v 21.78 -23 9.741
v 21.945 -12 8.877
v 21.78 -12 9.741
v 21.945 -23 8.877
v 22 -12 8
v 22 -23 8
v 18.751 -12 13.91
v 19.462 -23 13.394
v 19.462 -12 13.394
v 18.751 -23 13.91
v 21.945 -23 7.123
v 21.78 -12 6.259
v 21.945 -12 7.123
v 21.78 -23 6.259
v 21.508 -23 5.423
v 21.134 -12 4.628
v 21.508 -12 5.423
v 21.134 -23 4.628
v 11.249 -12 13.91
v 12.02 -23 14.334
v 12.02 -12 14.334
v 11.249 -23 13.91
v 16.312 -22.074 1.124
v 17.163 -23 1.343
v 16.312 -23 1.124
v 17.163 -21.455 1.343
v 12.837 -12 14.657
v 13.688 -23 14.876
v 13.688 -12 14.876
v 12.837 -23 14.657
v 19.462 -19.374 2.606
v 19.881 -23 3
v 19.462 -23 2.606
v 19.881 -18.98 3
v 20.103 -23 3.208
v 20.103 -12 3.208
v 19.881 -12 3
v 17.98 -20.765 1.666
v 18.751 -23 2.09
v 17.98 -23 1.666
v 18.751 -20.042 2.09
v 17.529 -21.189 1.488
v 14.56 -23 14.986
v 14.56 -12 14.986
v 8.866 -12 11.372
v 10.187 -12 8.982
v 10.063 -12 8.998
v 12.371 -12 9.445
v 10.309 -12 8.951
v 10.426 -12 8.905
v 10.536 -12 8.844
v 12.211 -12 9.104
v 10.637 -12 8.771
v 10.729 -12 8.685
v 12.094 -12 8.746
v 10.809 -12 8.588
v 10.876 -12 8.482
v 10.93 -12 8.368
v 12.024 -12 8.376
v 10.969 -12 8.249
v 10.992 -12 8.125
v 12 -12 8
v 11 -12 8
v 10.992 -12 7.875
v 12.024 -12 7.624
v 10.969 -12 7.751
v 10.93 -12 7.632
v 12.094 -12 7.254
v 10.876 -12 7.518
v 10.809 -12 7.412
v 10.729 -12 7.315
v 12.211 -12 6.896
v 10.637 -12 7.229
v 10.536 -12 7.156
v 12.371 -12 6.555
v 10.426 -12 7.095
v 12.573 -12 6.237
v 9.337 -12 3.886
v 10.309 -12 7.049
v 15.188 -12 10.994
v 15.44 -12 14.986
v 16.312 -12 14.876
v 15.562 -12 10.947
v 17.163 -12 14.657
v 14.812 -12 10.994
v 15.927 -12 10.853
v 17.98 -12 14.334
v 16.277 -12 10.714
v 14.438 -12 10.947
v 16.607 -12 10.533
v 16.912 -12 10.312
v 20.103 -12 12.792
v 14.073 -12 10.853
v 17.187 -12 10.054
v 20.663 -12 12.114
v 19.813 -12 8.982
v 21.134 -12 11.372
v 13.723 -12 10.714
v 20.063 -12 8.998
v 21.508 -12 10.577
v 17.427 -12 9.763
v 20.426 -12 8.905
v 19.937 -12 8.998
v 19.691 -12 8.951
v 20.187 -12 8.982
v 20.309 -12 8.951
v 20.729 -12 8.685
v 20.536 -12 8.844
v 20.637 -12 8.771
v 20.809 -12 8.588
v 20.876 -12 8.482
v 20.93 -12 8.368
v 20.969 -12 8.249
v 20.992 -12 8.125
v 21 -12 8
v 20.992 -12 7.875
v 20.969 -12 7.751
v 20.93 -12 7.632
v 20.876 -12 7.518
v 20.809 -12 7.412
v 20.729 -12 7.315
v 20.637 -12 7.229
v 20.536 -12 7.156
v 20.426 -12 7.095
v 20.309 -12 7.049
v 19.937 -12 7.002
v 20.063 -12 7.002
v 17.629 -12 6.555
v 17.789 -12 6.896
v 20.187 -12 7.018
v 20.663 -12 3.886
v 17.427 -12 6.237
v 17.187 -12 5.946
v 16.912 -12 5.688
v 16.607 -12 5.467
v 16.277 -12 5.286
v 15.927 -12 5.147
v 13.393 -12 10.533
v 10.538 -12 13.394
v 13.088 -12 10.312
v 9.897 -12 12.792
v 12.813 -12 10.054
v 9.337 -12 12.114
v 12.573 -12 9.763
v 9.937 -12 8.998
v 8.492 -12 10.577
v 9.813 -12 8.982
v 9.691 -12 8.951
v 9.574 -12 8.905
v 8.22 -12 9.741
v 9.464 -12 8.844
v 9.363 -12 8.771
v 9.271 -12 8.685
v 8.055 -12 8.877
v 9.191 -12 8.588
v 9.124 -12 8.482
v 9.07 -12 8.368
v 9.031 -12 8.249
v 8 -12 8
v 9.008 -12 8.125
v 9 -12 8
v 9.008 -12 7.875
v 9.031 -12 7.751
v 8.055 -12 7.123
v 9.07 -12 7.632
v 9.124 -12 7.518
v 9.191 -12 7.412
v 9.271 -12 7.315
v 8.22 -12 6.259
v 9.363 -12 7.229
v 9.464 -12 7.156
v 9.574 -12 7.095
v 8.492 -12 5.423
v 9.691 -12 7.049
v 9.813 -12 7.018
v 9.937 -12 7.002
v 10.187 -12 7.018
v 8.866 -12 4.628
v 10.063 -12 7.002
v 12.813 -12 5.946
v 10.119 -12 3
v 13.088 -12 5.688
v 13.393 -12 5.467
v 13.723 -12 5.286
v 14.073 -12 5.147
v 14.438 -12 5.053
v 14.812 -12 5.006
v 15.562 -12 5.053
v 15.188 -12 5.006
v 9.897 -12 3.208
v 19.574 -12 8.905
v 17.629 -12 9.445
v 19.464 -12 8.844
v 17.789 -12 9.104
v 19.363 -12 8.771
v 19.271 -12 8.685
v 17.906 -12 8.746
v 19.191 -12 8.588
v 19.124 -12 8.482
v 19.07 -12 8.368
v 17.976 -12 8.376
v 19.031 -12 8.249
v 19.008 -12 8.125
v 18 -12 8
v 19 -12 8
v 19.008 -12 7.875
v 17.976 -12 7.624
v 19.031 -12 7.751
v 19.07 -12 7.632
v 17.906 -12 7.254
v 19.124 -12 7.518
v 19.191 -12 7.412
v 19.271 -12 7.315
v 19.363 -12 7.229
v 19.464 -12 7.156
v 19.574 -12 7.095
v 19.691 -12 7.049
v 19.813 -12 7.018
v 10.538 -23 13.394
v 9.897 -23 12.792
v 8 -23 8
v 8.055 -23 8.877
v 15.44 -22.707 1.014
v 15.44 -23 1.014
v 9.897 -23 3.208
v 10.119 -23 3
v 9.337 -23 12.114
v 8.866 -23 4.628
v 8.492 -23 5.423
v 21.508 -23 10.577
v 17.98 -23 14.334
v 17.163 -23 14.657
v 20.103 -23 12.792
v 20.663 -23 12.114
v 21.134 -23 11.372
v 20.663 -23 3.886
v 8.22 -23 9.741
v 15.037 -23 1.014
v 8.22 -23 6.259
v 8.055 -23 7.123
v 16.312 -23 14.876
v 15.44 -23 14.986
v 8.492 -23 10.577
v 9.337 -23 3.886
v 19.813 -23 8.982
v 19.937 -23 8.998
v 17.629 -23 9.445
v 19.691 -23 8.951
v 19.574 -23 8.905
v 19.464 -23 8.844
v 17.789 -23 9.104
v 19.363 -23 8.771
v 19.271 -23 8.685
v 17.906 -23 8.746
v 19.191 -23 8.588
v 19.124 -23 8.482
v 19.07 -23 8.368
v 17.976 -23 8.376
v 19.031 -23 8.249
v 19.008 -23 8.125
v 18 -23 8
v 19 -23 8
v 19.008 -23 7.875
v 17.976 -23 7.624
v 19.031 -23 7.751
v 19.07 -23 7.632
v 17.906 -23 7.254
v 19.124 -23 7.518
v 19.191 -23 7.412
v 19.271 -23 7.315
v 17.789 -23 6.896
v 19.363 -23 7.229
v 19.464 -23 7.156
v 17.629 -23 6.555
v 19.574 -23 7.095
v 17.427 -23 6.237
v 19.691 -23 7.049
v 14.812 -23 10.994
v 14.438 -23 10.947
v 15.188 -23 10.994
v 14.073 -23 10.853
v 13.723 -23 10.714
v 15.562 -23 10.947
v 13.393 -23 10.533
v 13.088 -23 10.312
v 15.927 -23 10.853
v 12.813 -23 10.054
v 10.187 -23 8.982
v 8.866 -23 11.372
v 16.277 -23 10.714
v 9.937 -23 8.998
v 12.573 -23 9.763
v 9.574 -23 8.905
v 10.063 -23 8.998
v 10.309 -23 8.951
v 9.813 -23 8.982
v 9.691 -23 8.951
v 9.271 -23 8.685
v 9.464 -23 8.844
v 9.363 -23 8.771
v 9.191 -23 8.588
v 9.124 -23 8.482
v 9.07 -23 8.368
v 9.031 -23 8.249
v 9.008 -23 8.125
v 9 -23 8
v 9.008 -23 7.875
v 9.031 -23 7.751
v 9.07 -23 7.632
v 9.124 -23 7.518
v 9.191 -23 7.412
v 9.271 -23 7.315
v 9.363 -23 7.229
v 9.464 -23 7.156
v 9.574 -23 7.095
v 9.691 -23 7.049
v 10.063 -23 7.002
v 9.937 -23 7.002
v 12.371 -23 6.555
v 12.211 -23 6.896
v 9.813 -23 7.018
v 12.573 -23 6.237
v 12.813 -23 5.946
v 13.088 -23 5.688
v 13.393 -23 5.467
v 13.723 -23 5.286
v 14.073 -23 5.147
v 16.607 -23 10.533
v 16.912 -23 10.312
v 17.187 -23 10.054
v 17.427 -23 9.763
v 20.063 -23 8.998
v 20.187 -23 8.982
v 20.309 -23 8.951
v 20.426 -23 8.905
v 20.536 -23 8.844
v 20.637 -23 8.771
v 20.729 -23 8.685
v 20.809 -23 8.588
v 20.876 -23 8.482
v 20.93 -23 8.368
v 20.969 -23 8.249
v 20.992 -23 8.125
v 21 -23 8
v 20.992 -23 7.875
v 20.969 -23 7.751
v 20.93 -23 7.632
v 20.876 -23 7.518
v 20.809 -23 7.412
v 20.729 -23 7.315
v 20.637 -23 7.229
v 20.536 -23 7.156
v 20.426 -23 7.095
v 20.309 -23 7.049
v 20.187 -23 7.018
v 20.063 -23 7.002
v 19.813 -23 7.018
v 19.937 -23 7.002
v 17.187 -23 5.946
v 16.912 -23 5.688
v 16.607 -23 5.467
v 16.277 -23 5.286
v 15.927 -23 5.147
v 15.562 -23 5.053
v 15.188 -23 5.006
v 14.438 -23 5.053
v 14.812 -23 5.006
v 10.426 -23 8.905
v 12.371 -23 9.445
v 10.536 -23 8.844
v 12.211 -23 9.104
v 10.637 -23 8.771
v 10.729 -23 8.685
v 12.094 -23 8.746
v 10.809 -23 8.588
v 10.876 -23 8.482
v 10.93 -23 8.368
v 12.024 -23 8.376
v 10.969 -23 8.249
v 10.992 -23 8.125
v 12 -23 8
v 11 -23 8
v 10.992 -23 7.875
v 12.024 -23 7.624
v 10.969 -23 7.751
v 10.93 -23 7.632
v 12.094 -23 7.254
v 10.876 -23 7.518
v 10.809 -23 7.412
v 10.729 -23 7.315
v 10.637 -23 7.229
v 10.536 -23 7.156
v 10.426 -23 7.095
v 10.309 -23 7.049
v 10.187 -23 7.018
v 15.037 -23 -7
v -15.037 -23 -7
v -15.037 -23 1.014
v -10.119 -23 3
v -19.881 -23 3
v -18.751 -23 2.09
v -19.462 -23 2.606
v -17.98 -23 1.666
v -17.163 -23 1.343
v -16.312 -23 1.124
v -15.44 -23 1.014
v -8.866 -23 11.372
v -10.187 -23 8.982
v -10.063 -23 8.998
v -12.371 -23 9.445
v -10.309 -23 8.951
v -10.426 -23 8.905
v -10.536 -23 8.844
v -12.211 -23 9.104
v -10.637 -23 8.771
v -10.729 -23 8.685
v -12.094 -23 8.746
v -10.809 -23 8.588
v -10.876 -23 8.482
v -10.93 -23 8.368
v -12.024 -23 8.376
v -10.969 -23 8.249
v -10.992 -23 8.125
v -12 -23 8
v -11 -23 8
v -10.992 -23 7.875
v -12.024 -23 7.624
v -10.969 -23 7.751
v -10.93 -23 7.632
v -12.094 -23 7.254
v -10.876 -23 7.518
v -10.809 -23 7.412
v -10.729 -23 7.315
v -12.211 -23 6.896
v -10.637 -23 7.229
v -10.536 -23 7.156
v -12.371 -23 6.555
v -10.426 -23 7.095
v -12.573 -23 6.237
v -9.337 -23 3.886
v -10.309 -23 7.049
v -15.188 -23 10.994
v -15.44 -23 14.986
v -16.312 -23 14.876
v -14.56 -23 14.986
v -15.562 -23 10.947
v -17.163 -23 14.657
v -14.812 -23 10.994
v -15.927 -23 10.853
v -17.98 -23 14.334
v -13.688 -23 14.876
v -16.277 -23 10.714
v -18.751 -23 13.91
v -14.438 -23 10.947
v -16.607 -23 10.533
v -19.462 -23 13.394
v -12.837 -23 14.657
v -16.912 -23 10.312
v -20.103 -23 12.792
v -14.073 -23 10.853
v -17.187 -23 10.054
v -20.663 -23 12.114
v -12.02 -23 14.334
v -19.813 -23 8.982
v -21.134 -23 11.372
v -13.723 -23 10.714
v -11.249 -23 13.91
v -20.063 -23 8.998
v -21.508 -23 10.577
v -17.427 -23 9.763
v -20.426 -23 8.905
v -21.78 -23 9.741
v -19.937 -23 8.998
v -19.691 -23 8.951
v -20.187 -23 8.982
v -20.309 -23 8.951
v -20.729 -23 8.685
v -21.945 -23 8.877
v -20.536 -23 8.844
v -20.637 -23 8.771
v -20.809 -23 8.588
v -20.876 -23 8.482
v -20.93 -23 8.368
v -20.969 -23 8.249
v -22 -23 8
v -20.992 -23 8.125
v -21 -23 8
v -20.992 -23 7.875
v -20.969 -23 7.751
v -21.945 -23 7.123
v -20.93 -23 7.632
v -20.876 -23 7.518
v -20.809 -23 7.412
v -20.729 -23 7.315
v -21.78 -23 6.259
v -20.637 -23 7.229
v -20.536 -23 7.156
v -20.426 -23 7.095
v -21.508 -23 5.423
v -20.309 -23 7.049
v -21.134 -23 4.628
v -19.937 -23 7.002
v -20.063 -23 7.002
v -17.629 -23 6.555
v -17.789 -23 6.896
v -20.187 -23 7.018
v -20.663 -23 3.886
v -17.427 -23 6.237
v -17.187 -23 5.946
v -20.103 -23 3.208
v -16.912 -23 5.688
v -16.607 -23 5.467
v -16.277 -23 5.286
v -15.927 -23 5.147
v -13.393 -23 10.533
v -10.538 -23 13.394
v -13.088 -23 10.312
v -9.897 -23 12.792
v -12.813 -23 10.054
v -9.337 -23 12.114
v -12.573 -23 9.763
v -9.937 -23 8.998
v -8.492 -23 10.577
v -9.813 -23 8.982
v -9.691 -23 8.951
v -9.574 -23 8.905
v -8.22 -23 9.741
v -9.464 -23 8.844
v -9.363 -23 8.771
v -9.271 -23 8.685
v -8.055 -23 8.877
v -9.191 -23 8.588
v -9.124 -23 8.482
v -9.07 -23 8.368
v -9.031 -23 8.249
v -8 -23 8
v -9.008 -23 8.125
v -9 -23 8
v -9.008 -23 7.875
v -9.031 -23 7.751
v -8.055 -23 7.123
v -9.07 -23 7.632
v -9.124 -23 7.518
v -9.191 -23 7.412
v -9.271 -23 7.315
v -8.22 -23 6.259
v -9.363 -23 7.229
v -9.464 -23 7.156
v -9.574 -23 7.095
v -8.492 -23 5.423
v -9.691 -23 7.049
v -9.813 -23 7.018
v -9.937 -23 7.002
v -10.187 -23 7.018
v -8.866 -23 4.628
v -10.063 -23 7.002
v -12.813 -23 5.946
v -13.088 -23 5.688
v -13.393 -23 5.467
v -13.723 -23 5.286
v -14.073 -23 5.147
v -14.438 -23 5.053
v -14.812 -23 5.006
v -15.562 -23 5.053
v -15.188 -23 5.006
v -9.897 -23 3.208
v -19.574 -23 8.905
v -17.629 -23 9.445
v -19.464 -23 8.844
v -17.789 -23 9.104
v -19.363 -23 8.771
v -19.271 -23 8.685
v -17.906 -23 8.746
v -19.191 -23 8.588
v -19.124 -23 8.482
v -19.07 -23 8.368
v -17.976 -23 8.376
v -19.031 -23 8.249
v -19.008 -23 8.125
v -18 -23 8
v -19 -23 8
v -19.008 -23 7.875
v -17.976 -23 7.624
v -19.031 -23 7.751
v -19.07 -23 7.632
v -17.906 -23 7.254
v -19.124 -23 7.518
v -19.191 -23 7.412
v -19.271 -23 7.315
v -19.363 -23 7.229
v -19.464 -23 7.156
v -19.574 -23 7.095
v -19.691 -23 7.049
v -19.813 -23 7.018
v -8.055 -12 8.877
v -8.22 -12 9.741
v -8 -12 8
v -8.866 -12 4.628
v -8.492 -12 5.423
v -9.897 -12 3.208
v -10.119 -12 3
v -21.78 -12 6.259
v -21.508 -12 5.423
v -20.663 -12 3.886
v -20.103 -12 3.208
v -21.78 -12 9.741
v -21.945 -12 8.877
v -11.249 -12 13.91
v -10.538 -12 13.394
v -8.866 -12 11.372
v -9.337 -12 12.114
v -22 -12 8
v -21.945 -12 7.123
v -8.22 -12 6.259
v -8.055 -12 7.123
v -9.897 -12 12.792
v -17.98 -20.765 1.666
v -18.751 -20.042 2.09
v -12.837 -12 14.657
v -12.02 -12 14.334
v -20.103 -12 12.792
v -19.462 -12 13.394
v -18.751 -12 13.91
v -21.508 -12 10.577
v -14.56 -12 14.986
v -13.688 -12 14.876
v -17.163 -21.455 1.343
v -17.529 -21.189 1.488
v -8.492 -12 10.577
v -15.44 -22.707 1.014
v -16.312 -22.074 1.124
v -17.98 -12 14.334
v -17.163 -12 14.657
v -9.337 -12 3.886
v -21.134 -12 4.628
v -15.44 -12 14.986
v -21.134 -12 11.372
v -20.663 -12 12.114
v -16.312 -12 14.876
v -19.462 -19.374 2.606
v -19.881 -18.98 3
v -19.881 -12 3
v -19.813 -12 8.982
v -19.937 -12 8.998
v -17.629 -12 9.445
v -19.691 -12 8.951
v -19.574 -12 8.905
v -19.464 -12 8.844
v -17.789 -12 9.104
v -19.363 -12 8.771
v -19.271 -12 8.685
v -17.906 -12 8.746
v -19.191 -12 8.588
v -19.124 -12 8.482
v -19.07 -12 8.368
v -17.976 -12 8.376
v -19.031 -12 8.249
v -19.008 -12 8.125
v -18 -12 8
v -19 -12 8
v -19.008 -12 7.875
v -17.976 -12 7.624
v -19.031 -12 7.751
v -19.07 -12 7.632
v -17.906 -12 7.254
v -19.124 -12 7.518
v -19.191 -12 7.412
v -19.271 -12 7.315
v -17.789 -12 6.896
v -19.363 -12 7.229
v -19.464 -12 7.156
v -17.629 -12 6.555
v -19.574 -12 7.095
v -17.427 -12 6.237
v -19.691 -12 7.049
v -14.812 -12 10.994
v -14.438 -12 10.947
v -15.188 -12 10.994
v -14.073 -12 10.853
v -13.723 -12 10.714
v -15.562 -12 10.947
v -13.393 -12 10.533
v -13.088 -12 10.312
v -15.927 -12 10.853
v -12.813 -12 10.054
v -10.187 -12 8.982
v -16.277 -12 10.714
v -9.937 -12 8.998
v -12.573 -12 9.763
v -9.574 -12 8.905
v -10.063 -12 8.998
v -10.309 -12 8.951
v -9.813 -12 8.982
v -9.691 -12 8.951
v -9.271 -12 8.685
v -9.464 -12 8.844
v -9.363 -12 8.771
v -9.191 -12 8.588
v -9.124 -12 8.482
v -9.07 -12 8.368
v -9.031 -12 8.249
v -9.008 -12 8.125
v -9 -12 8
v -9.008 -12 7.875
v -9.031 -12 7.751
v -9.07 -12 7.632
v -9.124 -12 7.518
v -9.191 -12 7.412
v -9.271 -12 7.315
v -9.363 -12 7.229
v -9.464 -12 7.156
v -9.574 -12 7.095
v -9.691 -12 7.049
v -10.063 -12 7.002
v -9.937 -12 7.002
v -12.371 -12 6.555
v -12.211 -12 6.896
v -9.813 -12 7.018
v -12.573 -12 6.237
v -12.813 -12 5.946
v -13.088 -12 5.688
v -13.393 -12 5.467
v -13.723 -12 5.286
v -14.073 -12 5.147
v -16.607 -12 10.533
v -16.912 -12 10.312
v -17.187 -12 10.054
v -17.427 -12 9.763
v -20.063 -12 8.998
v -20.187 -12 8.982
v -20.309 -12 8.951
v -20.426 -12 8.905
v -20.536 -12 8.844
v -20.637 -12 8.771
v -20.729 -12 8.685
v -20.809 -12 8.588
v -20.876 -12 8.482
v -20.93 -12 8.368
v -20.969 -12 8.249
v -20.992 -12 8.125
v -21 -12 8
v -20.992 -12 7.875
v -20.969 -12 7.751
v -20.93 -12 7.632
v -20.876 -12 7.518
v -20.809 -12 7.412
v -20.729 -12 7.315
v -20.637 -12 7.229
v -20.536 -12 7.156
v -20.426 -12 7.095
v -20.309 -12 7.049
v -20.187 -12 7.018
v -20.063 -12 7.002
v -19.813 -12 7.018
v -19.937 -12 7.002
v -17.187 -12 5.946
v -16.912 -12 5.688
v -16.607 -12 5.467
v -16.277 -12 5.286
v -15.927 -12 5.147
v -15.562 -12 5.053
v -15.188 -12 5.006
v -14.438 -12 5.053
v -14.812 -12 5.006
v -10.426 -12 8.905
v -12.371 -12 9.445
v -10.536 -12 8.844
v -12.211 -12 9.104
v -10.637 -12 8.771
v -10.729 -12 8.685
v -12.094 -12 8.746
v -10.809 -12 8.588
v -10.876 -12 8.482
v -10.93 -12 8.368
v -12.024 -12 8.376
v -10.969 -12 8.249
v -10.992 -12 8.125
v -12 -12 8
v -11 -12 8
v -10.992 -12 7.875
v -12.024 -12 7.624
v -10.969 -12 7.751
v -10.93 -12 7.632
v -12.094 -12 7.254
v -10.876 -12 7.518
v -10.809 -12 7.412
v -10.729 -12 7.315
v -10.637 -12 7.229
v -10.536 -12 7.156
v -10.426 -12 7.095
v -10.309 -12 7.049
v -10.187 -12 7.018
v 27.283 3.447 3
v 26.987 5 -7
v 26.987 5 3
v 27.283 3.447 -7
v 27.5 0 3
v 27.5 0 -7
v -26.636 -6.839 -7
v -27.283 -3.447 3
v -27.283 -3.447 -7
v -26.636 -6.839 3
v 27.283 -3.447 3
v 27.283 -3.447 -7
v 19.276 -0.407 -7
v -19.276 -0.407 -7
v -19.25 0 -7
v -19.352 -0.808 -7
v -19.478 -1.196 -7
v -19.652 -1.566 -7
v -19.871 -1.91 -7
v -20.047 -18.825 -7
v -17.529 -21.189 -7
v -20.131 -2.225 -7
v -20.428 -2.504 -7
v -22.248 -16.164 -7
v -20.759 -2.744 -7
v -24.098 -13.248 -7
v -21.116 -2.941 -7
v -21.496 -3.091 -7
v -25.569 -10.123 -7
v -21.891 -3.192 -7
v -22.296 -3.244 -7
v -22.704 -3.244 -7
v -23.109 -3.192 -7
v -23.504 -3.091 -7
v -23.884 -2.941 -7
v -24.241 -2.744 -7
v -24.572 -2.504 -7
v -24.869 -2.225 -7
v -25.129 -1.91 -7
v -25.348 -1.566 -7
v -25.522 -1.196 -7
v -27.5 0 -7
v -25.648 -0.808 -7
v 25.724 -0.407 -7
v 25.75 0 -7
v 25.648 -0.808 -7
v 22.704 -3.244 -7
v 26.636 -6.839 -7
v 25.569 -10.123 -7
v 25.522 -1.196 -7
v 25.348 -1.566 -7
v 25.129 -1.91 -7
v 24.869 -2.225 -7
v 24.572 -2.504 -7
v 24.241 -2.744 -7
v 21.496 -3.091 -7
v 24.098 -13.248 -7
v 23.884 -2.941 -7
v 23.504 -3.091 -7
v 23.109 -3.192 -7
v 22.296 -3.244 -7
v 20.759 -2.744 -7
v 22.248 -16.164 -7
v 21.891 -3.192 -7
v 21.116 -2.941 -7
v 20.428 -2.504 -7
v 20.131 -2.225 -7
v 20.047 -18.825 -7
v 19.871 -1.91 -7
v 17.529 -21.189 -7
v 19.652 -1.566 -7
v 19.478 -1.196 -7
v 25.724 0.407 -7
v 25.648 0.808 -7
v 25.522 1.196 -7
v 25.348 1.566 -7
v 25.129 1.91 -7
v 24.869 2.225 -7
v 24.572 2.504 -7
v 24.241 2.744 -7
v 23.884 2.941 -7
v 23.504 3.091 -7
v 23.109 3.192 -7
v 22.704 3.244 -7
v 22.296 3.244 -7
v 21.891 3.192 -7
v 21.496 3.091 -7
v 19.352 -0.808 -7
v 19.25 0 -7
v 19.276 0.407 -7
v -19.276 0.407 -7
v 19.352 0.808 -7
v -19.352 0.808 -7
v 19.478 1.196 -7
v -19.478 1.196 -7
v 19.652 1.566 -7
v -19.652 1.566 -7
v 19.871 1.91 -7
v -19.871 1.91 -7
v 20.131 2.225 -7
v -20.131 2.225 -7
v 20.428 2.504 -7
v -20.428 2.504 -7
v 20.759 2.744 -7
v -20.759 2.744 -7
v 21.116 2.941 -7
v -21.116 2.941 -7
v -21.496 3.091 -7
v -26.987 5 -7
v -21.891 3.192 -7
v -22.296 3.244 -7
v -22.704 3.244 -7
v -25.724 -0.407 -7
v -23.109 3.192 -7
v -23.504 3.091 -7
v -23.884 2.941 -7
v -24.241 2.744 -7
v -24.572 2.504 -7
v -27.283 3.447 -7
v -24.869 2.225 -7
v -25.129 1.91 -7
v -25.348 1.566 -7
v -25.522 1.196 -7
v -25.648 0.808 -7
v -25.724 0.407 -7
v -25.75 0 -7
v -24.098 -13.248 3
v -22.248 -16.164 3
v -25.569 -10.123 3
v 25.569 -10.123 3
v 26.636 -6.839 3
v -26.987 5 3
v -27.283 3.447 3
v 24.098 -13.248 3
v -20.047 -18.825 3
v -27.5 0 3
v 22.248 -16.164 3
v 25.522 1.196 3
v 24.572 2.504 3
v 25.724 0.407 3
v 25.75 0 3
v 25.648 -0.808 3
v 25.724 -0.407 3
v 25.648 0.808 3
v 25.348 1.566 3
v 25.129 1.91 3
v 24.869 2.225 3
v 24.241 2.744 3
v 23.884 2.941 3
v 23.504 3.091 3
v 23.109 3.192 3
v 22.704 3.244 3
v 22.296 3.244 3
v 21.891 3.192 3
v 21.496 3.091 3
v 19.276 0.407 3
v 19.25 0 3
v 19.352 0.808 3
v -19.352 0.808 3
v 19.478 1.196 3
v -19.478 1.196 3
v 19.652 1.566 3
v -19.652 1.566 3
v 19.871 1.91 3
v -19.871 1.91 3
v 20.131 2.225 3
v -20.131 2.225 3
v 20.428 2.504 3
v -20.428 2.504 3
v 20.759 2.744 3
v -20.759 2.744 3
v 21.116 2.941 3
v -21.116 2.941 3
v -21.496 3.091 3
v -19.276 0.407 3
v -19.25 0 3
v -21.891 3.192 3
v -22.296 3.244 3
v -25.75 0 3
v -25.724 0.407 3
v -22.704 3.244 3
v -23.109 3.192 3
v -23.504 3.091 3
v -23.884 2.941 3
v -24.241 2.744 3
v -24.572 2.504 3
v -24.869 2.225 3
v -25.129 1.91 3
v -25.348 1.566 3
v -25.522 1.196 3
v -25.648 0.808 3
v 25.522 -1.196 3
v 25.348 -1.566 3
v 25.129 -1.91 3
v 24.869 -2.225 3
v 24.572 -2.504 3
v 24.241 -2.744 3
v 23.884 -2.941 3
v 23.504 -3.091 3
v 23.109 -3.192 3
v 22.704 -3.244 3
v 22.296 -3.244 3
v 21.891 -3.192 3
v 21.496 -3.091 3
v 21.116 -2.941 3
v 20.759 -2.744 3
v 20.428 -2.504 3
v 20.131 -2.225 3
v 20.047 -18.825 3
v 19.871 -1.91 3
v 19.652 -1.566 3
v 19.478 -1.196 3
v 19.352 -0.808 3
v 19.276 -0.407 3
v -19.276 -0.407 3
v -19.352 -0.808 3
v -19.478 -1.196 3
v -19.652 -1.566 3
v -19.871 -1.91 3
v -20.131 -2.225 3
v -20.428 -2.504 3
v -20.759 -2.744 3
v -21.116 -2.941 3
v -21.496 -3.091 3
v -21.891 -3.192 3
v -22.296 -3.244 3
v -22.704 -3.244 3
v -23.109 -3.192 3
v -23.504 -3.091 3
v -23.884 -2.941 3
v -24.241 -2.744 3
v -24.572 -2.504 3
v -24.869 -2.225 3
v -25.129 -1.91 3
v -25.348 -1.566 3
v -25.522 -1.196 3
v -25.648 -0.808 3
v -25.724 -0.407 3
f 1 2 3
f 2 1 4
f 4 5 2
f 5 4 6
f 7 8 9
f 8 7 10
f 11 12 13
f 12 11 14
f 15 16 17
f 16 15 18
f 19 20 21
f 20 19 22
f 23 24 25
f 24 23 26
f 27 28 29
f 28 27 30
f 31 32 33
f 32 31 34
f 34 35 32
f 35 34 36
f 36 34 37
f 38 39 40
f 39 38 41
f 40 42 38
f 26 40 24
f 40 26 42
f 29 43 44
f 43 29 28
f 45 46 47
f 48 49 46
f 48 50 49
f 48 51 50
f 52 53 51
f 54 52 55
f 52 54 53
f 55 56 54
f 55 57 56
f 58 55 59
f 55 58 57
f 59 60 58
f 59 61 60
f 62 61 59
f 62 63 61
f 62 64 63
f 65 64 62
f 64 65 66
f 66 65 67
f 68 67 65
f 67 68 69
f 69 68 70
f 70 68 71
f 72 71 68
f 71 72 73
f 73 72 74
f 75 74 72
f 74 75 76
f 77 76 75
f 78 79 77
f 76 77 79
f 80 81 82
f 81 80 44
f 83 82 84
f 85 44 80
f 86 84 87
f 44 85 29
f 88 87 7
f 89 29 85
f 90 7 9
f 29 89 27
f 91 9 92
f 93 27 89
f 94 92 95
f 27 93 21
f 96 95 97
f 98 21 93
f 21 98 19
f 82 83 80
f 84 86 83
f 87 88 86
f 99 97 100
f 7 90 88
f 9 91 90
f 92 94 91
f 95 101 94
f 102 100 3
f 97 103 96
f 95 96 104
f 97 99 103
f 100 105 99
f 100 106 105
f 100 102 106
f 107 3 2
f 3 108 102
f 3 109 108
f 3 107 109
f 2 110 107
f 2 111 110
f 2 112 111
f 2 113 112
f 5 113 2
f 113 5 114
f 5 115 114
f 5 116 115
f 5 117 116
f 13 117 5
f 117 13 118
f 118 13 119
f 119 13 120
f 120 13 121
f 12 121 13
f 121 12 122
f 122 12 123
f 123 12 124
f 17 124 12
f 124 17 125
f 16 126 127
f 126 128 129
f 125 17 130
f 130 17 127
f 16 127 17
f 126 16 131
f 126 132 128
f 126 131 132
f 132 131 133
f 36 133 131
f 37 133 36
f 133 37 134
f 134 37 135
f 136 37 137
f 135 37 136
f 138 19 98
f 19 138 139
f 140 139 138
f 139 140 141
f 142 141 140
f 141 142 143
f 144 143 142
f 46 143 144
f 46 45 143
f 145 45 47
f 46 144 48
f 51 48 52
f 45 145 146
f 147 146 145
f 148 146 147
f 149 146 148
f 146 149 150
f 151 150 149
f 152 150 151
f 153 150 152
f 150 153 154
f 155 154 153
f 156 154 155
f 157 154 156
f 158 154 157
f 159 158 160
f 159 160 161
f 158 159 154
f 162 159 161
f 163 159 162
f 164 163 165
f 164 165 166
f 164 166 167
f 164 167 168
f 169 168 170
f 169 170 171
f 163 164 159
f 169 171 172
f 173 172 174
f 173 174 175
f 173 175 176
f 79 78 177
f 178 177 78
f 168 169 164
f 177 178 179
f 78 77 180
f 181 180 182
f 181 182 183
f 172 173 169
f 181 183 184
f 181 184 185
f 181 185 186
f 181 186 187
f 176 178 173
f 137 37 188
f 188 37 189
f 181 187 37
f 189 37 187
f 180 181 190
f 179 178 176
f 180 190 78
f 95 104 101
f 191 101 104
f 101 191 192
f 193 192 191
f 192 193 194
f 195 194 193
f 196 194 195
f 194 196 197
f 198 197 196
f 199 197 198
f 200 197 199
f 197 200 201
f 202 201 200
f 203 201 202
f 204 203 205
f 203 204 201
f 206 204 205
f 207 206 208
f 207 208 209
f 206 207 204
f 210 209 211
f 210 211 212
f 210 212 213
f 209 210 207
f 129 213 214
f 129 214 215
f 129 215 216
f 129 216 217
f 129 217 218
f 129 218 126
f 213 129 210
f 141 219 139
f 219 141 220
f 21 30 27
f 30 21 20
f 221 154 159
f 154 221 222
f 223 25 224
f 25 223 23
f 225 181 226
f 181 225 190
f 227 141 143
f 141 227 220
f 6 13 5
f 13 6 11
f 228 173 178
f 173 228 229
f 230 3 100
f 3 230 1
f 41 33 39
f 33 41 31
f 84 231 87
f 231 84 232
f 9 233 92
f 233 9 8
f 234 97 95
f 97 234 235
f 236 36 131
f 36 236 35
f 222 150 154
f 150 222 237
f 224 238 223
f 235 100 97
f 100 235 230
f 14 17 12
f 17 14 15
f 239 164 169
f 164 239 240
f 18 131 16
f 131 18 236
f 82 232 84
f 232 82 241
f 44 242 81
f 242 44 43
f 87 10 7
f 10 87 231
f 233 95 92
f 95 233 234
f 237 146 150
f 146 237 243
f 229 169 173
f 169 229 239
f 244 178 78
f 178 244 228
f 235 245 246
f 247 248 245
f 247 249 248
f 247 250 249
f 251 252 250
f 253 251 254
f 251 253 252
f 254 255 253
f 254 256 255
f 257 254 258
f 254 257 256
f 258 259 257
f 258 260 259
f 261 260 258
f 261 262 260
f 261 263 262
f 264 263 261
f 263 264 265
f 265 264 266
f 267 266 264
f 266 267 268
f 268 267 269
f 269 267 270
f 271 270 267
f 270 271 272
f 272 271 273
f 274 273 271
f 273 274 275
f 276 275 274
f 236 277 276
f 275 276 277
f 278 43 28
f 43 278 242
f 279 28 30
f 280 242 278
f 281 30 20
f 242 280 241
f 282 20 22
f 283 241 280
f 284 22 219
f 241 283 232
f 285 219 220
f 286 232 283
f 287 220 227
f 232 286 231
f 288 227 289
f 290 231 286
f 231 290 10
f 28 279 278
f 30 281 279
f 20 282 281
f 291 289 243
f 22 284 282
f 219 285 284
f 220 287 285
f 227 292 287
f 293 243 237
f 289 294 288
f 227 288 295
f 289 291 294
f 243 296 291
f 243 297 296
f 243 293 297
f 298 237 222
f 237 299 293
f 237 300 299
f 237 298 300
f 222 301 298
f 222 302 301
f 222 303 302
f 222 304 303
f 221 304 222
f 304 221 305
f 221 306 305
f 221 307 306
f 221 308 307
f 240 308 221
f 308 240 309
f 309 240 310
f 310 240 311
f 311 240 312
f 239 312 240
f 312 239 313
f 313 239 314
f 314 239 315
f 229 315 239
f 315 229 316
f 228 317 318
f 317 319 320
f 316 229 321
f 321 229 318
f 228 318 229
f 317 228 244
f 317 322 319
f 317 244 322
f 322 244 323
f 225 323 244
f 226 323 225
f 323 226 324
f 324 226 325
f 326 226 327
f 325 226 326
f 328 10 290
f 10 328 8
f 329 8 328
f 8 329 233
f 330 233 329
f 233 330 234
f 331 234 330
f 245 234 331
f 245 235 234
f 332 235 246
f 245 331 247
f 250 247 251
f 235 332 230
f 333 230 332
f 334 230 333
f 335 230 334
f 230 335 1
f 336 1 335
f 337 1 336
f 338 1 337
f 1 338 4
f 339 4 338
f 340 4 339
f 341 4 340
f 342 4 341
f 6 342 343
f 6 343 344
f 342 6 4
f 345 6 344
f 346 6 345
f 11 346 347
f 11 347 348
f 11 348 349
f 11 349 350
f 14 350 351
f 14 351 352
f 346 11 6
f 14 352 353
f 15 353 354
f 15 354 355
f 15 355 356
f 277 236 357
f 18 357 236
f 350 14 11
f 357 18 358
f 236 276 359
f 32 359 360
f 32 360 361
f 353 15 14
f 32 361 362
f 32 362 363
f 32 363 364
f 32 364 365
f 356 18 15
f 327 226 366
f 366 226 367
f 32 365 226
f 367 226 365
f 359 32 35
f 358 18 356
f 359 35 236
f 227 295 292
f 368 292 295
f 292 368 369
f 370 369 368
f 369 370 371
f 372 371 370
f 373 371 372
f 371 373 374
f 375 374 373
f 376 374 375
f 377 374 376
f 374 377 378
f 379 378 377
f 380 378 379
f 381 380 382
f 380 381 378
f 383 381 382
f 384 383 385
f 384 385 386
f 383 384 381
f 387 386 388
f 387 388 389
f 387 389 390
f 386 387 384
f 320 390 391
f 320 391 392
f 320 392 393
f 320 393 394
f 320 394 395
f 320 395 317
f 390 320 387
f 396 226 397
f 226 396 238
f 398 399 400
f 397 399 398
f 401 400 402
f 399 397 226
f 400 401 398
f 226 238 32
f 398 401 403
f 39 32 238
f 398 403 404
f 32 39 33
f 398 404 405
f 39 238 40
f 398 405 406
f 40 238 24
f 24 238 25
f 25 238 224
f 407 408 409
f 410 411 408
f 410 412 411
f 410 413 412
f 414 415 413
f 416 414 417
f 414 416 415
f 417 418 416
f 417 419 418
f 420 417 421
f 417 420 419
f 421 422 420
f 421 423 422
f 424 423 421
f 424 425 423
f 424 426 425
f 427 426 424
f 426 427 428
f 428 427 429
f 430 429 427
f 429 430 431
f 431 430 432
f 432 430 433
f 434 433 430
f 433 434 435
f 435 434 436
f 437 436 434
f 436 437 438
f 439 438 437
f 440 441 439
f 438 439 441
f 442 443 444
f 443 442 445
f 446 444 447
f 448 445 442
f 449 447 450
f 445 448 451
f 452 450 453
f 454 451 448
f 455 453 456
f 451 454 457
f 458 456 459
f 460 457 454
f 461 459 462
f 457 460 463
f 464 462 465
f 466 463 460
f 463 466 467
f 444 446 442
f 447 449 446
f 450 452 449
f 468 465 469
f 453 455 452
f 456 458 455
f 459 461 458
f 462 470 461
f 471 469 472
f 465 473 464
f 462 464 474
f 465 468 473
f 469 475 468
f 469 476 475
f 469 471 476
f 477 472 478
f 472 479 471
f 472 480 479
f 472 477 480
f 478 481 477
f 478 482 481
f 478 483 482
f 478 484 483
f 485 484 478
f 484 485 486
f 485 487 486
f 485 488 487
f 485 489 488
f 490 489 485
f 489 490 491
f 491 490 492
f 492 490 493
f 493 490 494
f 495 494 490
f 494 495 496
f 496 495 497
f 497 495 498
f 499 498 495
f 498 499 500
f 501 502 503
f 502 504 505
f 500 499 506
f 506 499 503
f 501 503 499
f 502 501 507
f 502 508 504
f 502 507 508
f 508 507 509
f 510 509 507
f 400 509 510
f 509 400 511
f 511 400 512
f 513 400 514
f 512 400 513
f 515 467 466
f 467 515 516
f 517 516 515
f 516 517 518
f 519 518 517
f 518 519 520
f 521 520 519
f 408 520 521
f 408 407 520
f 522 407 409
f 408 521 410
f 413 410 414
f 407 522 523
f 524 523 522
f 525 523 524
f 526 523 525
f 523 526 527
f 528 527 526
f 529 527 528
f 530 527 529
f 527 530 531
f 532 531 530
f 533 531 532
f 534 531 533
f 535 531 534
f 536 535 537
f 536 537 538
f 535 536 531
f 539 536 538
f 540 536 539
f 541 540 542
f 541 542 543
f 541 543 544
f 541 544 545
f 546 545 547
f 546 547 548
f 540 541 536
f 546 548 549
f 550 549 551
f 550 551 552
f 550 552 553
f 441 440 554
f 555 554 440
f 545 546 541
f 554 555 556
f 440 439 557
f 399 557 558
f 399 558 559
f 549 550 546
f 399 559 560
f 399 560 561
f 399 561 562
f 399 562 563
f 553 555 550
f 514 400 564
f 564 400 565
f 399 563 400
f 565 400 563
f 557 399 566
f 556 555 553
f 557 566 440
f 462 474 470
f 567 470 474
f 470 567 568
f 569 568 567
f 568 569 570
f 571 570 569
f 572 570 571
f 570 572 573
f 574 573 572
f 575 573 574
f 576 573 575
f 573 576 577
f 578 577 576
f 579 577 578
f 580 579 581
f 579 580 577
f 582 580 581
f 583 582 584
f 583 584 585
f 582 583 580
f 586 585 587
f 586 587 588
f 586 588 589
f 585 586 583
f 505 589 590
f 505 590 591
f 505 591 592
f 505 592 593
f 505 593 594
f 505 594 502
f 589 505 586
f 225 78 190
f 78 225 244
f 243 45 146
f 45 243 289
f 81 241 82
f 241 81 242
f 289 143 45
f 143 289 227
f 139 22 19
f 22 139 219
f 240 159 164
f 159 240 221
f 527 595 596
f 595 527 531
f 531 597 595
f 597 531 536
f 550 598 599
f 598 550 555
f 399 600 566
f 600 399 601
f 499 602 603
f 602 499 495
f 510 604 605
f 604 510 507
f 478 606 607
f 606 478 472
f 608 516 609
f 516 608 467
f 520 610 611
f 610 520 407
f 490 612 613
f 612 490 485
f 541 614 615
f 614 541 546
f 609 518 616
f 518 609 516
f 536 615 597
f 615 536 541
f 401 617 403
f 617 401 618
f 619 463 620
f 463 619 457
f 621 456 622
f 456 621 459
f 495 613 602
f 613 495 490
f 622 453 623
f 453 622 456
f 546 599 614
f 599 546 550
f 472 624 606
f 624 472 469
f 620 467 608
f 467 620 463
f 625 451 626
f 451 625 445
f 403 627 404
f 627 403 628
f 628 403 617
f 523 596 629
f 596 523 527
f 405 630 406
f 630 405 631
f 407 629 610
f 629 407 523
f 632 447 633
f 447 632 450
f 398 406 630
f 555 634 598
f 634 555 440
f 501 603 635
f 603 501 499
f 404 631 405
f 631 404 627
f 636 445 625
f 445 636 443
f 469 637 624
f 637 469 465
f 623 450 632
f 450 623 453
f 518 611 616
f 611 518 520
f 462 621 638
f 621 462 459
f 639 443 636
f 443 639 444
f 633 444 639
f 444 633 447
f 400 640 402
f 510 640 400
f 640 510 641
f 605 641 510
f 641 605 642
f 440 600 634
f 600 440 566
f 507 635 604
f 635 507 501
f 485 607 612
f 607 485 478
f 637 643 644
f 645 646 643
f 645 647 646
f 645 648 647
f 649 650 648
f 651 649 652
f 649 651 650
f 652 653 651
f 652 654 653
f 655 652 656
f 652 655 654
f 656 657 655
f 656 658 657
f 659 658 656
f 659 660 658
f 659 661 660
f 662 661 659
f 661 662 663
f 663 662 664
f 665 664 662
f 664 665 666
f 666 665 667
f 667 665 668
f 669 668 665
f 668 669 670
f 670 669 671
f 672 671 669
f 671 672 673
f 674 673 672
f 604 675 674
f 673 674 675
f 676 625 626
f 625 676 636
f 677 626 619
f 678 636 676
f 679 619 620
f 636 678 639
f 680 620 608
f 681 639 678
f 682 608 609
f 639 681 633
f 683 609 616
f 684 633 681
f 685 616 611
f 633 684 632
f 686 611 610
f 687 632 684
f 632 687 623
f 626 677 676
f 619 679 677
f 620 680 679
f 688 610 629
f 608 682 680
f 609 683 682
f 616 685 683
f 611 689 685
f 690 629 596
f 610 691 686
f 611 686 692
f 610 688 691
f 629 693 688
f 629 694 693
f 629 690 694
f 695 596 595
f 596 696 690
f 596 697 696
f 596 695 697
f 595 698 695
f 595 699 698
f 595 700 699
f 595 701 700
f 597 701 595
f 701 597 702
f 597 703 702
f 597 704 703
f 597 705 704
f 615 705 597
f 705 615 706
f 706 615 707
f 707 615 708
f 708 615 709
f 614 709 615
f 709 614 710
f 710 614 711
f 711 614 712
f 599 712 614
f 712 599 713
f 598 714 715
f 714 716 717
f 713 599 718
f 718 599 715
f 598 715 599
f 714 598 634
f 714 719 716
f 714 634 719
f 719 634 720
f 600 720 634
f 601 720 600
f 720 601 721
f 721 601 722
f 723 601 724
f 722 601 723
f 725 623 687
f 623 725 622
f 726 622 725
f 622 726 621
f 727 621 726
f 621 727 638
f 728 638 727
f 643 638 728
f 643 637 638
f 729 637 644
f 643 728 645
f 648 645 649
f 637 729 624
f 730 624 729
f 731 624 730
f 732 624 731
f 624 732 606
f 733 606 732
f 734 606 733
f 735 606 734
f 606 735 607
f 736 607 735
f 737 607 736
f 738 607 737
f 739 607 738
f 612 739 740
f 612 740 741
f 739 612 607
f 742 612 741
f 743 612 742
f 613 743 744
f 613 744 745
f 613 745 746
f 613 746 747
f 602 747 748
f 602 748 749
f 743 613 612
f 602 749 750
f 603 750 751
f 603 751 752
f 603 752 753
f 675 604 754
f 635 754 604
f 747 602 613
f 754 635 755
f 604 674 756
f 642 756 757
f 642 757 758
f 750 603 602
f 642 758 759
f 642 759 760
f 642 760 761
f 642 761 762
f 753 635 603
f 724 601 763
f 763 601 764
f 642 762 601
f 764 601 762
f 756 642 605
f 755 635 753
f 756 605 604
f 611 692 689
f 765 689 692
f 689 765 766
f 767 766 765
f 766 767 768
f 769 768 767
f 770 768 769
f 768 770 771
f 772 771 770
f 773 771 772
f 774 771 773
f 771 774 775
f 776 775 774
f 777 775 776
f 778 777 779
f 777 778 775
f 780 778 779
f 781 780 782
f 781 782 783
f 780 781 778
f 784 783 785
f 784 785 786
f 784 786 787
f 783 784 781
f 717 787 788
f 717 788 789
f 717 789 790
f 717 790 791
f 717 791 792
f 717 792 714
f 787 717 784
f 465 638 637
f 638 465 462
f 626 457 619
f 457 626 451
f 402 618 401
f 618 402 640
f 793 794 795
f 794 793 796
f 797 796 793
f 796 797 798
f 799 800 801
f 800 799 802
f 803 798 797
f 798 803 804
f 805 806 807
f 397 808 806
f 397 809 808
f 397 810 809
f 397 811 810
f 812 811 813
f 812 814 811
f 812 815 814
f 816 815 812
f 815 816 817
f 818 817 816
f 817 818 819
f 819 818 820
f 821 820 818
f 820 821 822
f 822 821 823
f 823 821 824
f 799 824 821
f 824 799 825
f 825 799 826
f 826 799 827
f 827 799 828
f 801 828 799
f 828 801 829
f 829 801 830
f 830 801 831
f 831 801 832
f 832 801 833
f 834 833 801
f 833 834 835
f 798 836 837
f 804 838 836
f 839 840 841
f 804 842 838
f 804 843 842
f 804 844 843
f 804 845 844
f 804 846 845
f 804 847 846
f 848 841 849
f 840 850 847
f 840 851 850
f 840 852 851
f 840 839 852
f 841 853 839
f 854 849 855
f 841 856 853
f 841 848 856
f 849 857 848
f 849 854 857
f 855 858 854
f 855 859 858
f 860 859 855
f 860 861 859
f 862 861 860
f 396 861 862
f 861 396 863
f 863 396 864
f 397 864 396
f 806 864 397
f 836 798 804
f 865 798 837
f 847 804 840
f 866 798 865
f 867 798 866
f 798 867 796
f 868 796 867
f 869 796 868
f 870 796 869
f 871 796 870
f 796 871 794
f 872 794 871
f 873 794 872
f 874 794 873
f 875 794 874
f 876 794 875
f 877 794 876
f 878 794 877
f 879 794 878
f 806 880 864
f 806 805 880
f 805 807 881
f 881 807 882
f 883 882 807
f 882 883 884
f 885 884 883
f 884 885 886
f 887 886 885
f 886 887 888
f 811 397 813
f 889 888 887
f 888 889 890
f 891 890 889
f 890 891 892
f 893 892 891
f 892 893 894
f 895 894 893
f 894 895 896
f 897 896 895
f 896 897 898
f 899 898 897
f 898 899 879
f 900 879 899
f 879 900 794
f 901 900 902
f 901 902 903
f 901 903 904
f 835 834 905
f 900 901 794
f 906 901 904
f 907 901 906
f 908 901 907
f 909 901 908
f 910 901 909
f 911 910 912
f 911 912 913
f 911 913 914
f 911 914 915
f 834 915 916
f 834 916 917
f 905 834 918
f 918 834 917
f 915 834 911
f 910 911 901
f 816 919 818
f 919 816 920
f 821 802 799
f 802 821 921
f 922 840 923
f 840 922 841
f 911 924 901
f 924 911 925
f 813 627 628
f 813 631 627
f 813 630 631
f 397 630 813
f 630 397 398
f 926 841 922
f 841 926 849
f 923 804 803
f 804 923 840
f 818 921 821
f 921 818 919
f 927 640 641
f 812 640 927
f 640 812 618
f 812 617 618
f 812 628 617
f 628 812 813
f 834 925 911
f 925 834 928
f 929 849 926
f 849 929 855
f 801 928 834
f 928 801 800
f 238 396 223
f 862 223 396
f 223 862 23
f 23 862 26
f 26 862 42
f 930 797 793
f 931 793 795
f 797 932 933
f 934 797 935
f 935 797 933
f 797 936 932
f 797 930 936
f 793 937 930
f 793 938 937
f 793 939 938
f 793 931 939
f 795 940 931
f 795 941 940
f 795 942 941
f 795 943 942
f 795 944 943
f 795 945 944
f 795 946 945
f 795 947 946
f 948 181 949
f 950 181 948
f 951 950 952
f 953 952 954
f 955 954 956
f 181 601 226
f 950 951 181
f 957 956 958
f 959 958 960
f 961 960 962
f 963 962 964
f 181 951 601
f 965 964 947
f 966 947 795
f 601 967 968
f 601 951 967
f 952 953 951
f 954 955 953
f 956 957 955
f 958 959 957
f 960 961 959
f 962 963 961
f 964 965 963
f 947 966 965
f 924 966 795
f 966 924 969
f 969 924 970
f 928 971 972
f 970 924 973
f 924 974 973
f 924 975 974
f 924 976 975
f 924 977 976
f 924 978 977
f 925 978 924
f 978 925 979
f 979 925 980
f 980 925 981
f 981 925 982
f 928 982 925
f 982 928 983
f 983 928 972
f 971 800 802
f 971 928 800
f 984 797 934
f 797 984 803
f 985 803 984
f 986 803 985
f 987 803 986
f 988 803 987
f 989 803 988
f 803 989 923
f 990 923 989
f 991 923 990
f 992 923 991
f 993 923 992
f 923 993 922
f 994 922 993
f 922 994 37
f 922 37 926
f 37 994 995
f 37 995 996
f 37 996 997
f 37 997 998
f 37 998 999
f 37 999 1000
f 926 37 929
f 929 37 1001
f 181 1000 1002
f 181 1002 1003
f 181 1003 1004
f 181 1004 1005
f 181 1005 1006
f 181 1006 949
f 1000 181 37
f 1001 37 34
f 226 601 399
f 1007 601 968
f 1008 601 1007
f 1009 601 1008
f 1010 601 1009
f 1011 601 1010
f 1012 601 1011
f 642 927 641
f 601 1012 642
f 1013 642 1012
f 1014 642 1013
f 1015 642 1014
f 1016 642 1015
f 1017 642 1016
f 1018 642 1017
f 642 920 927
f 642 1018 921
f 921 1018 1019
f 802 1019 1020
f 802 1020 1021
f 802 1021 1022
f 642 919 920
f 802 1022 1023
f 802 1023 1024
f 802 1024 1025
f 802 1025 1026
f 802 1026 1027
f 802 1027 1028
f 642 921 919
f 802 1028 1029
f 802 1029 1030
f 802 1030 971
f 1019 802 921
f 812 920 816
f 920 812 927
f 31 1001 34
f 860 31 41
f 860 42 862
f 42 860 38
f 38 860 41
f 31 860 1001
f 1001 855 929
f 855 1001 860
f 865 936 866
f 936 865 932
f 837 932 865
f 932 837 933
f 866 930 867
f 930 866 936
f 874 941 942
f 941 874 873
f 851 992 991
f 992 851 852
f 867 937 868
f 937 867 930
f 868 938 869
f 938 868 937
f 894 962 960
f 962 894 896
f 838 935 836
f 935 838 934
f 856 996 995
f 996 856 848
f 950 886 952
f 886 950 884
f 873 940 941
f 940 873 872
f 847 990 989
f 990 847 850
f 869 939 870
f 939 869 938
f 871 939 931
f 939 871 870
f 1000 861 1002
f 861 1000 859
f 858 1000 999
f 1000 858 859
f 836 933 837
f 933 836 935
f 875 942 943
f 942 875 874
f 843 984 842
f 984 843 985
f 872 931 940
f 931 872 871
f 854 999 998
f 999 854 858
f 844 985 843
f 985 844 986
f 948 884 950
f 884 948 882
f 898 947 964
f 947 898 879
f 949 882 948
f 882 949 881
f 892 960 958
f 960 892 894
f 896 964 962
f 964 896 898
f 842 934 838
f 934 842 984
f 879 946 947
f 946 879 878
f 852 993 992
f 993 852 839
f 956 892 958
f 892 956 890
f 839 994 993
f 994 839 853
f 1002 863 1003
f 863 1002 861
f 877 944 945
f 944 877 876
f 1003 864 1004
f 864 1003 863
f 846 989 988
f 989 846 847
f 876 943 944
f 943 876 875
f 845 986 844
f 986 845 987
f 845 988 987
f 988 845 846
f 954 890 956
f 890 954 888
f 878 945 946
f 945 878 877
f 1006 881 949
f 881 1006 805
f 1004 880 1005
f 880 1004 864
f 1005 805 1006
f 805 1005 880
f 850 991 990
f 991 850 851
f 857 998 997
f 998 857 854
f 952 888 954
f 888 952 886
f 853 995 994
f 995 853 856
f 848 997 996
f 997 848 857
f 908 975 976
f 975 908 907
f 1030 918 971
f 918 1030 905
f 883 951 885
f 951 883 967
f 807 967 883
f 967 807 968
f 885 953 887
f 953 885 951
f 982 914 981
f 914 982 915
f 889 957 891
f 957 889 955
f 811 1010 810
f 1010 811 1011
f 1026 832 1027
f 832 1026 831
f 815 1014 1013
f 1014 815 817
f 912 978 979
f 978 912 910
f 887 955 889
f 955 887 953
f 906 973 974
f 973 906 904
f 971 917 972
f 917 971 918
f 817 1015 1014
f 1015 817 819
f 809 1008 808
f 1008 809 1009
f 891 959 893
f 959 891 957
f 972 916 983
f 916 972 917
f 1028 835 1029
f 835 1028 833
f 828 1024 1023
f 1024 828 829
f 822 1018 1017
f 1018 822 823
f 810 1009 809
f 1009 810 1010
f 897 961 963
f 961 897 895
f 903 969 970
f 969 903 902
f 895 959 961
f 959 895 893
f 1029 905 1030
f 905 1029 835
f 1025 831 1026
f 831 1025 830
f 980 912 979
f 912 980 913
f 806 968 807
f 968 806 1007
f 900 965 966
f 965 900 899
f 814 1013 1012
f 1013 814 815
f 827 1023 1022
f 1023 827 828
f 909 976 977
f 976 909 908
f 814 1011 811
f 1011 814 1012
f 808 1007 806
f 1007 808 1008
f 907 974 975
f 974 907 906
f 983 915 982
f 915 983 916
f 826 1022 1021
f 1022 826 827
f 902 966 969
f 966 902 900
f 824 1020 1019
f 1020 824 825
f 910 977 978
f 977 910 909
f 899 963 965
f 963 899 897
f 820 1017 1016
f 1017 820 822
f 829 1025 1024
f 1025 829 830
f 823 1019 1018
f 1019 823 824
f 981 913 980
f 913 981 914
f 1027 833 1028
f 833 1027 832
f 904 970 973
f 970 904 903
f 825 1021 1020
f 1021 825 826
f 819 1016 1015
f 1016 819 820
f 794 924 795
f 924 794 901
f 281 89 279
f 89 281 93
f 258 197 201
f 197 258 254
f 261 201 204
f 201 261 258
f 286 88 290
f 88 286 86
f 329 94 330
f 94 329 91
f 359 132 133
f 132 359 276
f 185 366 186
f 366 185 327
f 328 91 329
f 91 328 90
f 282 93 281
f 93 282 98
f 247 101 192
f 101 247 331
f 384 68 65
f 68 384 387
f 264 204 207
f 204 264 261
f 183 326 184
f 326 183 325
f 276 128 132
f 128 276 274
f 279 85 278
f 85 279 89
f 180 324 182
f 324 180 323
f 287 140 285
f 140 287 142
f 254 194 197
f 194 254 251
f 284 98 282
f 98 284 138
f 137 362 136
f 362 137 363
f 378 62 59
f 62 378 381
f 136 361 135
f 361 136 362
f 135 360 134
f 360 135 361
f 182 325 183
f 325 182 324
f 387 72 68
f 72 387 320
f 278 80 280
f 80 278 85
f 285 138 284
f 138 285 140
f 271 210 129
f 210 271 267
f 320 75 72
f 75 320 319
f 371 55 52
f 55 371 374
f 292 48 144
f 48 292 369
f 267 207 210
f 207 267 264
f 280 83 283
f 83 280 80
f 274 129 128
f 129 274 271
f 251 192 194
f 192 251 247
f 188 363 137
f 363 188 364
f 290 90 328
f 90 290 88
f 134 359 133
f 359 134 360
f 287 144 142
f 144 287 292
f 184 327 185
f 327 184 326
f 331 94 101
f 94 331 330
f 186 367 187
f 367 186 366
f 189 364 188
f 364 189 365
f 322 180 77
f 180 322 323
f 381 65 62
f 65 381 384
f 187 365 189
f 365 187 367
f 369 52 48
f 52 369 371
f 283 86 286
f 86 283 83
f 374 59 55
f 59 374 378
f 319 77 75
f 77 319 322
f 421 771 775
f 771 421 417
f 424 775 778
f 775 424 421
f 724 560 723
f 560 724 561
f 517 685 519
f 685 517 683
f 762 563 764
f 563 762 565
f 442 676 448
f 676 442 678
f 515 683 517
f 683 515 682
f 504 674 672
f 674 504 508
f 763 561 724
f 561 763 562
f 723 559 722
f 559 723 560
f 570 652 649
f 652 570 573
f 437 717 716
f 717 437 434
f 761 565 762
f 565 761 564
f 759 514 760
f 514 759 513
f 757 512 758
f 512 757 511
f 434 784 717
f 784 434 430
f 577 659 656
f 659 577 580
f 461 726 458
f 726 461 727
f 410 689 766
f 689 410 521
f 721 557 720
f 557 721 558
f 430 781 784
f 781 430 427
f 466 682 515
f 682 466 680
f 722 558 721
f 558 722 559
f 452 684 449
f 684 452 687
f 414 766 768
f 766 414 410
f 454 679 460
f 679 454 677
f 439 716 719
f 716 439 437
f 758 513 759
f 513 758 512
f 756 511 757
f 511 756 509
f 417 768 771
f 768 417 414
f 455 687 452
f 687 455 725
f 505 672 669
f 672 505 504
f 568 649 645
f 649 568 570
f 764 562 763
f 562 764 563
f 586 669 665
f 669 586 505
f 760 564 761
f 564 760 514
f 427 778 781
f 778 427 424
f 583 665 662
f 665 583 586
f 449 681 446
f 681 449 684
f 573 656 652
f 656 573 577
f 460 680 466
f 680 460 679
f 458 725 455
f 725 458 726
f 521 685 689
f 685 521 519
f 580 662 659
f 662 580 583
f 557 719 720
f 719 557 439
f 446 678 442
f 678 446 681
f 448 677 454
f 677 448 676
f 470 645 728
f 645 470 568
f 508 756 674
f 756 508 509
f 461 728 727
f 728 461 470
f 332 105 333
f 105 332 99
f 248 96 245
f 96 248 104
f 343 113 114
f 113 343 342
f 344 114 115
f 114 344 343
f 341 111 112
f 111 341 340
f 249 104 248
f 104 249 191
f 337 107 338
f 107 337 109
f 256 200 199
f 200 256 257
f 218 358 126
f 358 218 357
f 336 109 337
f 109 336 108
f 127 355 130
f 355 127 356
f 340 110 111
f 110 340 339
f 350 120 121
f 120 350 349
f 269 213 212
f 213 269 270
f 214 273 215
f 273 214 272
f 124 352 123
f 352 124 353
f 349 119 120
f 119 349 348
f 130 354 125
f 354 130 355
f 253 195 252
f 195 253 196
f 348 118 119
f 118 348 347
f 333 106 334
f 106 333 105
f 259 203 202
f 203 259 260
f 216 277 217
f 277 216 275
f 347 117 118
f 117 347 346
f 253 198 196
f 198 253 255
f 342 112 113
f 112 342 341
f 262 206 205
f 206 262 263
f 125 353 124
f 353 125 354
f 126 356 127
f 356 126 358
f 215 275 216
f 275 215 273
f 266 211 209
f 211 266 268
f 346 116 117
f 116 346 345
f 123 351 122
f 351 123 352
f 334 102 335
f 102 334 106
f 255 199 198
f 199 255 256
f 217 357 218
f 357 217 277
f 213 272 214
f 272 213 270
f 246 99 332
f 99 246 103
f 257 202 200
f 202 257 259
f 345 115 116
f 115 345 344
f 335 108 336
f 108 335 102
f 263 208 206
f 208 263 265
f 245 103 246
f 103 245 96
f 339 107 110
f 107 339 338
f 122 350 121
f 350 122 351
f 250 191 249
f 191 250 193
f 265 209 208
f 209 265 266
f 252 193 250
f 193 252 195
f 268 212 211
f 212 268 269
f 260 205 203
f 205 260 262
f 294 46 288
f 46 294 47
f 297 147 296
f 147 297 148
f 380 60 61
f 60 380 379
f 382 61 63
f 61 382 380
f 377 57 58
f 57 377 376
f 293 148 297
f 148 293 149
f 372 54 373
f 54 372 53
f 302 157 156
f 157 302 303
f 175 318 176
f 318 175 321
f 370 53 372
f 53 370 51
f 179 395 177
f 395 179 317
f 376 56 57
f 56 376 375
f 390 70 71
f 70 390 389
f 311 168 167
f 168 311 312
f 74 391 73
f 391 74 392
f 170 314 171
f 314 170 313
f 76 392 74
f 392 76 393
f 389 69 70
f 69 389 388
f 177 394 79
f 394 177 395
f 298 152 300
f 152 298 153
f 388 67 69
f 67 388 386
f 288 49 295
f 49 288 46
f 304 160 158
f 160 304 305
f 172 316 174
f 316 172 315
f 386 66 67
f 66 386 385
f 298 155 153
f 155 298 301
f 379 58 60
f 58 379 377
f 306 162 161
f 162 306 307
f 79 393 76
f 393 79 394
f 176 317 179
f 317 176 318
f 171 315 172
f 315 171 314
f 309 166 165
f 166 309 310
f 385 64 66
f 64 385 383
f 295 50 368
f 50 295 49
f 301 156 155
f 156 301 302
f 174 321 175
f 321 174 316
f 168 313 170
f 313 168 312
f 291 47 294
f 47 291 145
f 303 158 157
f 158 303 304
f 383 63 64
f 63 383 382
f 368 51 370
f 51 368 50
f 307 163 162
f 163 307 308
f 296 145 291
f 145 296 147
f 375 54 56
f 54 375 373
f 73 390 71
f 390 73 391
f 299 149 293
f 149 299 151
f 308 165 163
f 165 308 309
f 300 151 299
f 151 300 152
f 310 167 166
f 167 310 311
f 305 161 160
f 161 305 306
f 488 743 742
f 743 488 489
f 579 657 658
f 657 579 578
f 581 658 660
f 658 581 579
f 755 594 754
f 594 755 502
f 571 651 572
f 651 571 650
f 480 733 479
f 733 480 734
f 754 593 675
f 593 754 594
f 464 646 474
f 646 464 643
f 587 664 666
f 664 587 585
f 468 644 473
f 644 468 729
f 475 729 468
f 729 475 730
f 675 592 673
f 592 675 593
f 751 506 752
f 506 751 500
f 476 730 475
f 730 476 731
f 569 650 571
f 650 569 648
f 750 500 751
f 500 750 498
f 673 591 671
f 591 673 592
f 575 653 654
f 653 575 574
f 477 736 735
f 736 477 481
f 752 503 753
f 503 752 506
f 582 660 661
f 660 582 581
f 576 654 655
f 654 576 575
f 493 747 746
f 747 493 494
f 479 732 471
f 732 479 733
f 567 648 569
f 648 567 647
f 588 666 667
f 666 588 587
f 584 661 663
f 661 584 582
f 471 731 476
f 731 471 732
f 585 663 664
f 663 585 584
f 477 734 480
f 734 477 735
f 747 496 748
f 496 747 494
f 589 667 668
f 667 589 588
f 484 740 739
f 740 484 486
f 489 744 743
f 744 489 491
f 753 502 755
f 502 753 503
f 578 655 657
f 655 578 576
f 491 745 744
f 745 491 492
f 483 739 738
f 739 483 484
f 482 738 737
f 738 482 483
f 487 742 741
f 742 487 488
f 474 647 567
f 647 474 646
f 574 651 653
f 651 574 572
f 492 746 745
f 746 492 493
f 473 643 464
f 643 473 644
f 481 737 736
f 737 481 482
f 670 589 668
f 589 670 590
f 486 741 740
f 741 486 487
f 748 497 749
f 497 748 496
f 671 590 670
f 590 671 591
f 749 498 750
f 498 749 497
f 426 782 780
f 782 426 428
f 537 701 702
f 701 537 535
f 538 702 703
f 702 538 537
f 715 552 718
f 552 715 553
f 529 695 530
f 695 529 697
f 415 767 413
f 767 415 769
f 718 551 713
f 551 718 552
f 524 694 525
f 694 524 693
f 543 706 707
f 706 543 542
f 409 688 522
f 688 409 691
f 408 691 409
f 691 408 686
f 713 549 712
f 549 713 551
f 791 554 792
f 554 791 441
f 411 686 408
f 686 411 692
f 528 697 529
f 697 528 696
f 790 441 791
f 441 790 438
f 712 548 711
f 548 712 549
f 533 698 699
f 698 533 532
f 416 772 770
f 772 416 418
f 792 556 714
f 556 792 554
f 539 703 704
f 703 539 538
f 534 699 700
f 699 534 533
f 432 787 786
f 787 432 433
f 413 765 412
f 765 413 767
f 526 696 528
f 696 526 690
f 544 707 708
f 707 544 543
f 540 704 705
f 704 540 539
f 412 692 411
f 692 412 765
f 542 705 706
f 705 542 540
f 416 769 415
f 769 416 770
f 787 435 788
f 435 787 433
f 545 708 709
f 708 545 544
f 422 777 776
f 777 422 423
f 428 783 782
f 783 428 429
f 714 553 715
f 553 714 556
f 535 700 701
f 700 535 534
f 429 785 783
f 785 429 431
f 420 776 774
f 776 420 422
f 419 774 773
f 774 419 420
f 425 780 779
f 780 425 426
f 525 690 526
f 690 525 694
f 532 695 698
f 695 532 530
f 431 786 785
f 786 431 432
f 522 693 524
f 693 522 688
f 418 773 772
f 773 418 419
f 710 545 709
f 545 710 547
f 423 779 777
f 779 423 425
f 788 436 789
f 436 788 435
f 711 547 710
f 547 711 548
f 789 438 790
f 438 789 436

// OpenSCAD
/****************************************************************
* title: rocket payload end cap
* author: Boris du Reau
* version: 1.0
* date: 07/02/2015
* Description: print a coupler
* Howto use it:
* Modify the variables values so that it fits to your rocket tube 
* then just click on "compile and render" 
* Note that all units ar metrics
*****************************************************************/


/* adjust variables here */ 
/* It is recommended to print a sample to make sure that the diameter is correct */


resolution=50;
capHeight = 3;
capCouplerHeight = 10;
tubeThickness=2.5;
capOutDiameter = 60;
//set to true if you want holes or set to false if you don't
drillHoles = true;
holeDiameter = 3.5;
distanceBetweenSwitches=30;
distanceBetweenHole = 45;
distanceTBlocHole = 25;
butHeight = 11;


/* Do not modify anything after that unless you know what you are doing*/

module payloadCap () {
//cylinder(r=capOutDiameter/2, h=capHeight, $fn=resolution);
translate([distanceBetweenSwitches/2,-(capOutDiameter/5),8 ]) rotate ([90,0,0]) cylinder(r=7, h=butHeight, $fn=resolution);
translate([-distanceBetweenSwitches/2,-(capOutDiameter/5), 8]) rotate ([90,0,0]) cylinder(r=7, h=butHeight, $fn=resolution);
translate([0,0,-(capCouplerHeight-3)]) 
cylinder(r=(capOutDiameter/2)-tubeThickness, h=capCouplerHeight, $fn=resolution);
//translate([-capOutDiameter/2, -3,-10]) cube([capOutDiameter,3,20]);

}


//draw the full payload cap with holes
difference() {
payloadCap ();
translate([-capOutDiameter/2,-33, -(capCouplerHeight-3)])cube([capOutDiameter,10,capCouplerHeight]);
translate([-capOutDiameter/2,5, -(capCouplerHeight-3)])cube([capOutDiameter,capOutDiameter/2,capCouplerHeight]);

translate([distanceBetweenSwitches/2,-(capOutDiameter/5),8 ]) rotate ([90,0,0]) cylinder(r=3, h=butHeight, $fn=resolution);
translate([-distanceBetweenSwitches/2,-(capOutDiameter/5),8 ]) rotate ([90,0,0]) cylinder(r=3, h=butHeight, $fn=resolution);

translate([(distanceBetweenSwitches/2)+5,-(capOutDiameter/5),8 ]) rotate ([90,0,0]) cylinder(r=1, h=butHeight, $fn=resolution);
translate([-5+(distanceBetweenSwitches/2),-(capOutDiameter/5),8 ]) rotate ([90,0,0]) cylinder(r=1, h=butHeight, $fn=resolution);

translate([-((distanceBetweenSwitches/2)+5),-(capOutDiameter/5),8 ]) rotate ([90,0,0]) cylinder(r=1, h=butHeight, $fn=resolution);
translate([5-(distanceBetweenSwitches/2),-(capOutDiameter/5),8 ]) rotate ([90,0,0]) cylinder(r=1, h=butHeight, $fn=resolution);

	if (drillHoles == true)
	{
		//drill a couple of hole
		translate([distanceBetweenHole/2,0,-capCouplerHeight]) cylinder(r=6.5/2, h=capHeight+capCouplerHeight, $fn=resolution);

		translate([-distanceBetweenHole/2,0,-capCouplerHeight]) cylinder(r=6.5/2, h=capHeight+capCouplerHeight, $fn=resolution);
		/*rotate ([90,0,0]) translate([distanceBetweenHole/2,-2,-capHeight/2]) cylinder(r=3.5/2, h=capOutDiameter, $fn=resolution);

		rotate ([90,0,0]) translate([-distanceBetweenHole/2,-2,-capHeight/2]) cylinder(r=3.5/2, h=capOutDiameter, $fn=resolution);

rotate ([90,0,0]) translate([distanceBetweenHole/2,-2,10]) cylinder(r=5.5/2, h=capOutDiameter, $fn=resolution);
rotate ([90,0,0]) translate([-distanceBetweenHole/2,-2,10]) cylinder(r=5.5/2, h=capOutDiameter, $fn=resolution);*/
//center hole
//cylinder(r=4/2, h=capHeight+capCouplerHeight, $fn=resolution);
//terminal bloc
//translate([0,-distanceTBlocHole/2,0]) cylinder(r=3/2, h=capHeight+capCouplerHeight, $fn=resolution);
//translate([0,distanceTBlocHole/2,0]) cylinder(r=3/2, h=capHeight+capCouplerHeight, $fn=resolution);

//wires
//translate([-distanceTBlocHole/2.5,-distanceTBlocHole/2.5,0]) cylinder(r=4.5/2, h=capHeight+capCouplerHeight, $fn=resolution);
//translate([distanceTBlocHole/2.5,distanceTBlocHole/2.5,0]) cylinder(r=4.5/2, h=capHeight+capCouplerHeight, $fn=resolution);

	}
}
